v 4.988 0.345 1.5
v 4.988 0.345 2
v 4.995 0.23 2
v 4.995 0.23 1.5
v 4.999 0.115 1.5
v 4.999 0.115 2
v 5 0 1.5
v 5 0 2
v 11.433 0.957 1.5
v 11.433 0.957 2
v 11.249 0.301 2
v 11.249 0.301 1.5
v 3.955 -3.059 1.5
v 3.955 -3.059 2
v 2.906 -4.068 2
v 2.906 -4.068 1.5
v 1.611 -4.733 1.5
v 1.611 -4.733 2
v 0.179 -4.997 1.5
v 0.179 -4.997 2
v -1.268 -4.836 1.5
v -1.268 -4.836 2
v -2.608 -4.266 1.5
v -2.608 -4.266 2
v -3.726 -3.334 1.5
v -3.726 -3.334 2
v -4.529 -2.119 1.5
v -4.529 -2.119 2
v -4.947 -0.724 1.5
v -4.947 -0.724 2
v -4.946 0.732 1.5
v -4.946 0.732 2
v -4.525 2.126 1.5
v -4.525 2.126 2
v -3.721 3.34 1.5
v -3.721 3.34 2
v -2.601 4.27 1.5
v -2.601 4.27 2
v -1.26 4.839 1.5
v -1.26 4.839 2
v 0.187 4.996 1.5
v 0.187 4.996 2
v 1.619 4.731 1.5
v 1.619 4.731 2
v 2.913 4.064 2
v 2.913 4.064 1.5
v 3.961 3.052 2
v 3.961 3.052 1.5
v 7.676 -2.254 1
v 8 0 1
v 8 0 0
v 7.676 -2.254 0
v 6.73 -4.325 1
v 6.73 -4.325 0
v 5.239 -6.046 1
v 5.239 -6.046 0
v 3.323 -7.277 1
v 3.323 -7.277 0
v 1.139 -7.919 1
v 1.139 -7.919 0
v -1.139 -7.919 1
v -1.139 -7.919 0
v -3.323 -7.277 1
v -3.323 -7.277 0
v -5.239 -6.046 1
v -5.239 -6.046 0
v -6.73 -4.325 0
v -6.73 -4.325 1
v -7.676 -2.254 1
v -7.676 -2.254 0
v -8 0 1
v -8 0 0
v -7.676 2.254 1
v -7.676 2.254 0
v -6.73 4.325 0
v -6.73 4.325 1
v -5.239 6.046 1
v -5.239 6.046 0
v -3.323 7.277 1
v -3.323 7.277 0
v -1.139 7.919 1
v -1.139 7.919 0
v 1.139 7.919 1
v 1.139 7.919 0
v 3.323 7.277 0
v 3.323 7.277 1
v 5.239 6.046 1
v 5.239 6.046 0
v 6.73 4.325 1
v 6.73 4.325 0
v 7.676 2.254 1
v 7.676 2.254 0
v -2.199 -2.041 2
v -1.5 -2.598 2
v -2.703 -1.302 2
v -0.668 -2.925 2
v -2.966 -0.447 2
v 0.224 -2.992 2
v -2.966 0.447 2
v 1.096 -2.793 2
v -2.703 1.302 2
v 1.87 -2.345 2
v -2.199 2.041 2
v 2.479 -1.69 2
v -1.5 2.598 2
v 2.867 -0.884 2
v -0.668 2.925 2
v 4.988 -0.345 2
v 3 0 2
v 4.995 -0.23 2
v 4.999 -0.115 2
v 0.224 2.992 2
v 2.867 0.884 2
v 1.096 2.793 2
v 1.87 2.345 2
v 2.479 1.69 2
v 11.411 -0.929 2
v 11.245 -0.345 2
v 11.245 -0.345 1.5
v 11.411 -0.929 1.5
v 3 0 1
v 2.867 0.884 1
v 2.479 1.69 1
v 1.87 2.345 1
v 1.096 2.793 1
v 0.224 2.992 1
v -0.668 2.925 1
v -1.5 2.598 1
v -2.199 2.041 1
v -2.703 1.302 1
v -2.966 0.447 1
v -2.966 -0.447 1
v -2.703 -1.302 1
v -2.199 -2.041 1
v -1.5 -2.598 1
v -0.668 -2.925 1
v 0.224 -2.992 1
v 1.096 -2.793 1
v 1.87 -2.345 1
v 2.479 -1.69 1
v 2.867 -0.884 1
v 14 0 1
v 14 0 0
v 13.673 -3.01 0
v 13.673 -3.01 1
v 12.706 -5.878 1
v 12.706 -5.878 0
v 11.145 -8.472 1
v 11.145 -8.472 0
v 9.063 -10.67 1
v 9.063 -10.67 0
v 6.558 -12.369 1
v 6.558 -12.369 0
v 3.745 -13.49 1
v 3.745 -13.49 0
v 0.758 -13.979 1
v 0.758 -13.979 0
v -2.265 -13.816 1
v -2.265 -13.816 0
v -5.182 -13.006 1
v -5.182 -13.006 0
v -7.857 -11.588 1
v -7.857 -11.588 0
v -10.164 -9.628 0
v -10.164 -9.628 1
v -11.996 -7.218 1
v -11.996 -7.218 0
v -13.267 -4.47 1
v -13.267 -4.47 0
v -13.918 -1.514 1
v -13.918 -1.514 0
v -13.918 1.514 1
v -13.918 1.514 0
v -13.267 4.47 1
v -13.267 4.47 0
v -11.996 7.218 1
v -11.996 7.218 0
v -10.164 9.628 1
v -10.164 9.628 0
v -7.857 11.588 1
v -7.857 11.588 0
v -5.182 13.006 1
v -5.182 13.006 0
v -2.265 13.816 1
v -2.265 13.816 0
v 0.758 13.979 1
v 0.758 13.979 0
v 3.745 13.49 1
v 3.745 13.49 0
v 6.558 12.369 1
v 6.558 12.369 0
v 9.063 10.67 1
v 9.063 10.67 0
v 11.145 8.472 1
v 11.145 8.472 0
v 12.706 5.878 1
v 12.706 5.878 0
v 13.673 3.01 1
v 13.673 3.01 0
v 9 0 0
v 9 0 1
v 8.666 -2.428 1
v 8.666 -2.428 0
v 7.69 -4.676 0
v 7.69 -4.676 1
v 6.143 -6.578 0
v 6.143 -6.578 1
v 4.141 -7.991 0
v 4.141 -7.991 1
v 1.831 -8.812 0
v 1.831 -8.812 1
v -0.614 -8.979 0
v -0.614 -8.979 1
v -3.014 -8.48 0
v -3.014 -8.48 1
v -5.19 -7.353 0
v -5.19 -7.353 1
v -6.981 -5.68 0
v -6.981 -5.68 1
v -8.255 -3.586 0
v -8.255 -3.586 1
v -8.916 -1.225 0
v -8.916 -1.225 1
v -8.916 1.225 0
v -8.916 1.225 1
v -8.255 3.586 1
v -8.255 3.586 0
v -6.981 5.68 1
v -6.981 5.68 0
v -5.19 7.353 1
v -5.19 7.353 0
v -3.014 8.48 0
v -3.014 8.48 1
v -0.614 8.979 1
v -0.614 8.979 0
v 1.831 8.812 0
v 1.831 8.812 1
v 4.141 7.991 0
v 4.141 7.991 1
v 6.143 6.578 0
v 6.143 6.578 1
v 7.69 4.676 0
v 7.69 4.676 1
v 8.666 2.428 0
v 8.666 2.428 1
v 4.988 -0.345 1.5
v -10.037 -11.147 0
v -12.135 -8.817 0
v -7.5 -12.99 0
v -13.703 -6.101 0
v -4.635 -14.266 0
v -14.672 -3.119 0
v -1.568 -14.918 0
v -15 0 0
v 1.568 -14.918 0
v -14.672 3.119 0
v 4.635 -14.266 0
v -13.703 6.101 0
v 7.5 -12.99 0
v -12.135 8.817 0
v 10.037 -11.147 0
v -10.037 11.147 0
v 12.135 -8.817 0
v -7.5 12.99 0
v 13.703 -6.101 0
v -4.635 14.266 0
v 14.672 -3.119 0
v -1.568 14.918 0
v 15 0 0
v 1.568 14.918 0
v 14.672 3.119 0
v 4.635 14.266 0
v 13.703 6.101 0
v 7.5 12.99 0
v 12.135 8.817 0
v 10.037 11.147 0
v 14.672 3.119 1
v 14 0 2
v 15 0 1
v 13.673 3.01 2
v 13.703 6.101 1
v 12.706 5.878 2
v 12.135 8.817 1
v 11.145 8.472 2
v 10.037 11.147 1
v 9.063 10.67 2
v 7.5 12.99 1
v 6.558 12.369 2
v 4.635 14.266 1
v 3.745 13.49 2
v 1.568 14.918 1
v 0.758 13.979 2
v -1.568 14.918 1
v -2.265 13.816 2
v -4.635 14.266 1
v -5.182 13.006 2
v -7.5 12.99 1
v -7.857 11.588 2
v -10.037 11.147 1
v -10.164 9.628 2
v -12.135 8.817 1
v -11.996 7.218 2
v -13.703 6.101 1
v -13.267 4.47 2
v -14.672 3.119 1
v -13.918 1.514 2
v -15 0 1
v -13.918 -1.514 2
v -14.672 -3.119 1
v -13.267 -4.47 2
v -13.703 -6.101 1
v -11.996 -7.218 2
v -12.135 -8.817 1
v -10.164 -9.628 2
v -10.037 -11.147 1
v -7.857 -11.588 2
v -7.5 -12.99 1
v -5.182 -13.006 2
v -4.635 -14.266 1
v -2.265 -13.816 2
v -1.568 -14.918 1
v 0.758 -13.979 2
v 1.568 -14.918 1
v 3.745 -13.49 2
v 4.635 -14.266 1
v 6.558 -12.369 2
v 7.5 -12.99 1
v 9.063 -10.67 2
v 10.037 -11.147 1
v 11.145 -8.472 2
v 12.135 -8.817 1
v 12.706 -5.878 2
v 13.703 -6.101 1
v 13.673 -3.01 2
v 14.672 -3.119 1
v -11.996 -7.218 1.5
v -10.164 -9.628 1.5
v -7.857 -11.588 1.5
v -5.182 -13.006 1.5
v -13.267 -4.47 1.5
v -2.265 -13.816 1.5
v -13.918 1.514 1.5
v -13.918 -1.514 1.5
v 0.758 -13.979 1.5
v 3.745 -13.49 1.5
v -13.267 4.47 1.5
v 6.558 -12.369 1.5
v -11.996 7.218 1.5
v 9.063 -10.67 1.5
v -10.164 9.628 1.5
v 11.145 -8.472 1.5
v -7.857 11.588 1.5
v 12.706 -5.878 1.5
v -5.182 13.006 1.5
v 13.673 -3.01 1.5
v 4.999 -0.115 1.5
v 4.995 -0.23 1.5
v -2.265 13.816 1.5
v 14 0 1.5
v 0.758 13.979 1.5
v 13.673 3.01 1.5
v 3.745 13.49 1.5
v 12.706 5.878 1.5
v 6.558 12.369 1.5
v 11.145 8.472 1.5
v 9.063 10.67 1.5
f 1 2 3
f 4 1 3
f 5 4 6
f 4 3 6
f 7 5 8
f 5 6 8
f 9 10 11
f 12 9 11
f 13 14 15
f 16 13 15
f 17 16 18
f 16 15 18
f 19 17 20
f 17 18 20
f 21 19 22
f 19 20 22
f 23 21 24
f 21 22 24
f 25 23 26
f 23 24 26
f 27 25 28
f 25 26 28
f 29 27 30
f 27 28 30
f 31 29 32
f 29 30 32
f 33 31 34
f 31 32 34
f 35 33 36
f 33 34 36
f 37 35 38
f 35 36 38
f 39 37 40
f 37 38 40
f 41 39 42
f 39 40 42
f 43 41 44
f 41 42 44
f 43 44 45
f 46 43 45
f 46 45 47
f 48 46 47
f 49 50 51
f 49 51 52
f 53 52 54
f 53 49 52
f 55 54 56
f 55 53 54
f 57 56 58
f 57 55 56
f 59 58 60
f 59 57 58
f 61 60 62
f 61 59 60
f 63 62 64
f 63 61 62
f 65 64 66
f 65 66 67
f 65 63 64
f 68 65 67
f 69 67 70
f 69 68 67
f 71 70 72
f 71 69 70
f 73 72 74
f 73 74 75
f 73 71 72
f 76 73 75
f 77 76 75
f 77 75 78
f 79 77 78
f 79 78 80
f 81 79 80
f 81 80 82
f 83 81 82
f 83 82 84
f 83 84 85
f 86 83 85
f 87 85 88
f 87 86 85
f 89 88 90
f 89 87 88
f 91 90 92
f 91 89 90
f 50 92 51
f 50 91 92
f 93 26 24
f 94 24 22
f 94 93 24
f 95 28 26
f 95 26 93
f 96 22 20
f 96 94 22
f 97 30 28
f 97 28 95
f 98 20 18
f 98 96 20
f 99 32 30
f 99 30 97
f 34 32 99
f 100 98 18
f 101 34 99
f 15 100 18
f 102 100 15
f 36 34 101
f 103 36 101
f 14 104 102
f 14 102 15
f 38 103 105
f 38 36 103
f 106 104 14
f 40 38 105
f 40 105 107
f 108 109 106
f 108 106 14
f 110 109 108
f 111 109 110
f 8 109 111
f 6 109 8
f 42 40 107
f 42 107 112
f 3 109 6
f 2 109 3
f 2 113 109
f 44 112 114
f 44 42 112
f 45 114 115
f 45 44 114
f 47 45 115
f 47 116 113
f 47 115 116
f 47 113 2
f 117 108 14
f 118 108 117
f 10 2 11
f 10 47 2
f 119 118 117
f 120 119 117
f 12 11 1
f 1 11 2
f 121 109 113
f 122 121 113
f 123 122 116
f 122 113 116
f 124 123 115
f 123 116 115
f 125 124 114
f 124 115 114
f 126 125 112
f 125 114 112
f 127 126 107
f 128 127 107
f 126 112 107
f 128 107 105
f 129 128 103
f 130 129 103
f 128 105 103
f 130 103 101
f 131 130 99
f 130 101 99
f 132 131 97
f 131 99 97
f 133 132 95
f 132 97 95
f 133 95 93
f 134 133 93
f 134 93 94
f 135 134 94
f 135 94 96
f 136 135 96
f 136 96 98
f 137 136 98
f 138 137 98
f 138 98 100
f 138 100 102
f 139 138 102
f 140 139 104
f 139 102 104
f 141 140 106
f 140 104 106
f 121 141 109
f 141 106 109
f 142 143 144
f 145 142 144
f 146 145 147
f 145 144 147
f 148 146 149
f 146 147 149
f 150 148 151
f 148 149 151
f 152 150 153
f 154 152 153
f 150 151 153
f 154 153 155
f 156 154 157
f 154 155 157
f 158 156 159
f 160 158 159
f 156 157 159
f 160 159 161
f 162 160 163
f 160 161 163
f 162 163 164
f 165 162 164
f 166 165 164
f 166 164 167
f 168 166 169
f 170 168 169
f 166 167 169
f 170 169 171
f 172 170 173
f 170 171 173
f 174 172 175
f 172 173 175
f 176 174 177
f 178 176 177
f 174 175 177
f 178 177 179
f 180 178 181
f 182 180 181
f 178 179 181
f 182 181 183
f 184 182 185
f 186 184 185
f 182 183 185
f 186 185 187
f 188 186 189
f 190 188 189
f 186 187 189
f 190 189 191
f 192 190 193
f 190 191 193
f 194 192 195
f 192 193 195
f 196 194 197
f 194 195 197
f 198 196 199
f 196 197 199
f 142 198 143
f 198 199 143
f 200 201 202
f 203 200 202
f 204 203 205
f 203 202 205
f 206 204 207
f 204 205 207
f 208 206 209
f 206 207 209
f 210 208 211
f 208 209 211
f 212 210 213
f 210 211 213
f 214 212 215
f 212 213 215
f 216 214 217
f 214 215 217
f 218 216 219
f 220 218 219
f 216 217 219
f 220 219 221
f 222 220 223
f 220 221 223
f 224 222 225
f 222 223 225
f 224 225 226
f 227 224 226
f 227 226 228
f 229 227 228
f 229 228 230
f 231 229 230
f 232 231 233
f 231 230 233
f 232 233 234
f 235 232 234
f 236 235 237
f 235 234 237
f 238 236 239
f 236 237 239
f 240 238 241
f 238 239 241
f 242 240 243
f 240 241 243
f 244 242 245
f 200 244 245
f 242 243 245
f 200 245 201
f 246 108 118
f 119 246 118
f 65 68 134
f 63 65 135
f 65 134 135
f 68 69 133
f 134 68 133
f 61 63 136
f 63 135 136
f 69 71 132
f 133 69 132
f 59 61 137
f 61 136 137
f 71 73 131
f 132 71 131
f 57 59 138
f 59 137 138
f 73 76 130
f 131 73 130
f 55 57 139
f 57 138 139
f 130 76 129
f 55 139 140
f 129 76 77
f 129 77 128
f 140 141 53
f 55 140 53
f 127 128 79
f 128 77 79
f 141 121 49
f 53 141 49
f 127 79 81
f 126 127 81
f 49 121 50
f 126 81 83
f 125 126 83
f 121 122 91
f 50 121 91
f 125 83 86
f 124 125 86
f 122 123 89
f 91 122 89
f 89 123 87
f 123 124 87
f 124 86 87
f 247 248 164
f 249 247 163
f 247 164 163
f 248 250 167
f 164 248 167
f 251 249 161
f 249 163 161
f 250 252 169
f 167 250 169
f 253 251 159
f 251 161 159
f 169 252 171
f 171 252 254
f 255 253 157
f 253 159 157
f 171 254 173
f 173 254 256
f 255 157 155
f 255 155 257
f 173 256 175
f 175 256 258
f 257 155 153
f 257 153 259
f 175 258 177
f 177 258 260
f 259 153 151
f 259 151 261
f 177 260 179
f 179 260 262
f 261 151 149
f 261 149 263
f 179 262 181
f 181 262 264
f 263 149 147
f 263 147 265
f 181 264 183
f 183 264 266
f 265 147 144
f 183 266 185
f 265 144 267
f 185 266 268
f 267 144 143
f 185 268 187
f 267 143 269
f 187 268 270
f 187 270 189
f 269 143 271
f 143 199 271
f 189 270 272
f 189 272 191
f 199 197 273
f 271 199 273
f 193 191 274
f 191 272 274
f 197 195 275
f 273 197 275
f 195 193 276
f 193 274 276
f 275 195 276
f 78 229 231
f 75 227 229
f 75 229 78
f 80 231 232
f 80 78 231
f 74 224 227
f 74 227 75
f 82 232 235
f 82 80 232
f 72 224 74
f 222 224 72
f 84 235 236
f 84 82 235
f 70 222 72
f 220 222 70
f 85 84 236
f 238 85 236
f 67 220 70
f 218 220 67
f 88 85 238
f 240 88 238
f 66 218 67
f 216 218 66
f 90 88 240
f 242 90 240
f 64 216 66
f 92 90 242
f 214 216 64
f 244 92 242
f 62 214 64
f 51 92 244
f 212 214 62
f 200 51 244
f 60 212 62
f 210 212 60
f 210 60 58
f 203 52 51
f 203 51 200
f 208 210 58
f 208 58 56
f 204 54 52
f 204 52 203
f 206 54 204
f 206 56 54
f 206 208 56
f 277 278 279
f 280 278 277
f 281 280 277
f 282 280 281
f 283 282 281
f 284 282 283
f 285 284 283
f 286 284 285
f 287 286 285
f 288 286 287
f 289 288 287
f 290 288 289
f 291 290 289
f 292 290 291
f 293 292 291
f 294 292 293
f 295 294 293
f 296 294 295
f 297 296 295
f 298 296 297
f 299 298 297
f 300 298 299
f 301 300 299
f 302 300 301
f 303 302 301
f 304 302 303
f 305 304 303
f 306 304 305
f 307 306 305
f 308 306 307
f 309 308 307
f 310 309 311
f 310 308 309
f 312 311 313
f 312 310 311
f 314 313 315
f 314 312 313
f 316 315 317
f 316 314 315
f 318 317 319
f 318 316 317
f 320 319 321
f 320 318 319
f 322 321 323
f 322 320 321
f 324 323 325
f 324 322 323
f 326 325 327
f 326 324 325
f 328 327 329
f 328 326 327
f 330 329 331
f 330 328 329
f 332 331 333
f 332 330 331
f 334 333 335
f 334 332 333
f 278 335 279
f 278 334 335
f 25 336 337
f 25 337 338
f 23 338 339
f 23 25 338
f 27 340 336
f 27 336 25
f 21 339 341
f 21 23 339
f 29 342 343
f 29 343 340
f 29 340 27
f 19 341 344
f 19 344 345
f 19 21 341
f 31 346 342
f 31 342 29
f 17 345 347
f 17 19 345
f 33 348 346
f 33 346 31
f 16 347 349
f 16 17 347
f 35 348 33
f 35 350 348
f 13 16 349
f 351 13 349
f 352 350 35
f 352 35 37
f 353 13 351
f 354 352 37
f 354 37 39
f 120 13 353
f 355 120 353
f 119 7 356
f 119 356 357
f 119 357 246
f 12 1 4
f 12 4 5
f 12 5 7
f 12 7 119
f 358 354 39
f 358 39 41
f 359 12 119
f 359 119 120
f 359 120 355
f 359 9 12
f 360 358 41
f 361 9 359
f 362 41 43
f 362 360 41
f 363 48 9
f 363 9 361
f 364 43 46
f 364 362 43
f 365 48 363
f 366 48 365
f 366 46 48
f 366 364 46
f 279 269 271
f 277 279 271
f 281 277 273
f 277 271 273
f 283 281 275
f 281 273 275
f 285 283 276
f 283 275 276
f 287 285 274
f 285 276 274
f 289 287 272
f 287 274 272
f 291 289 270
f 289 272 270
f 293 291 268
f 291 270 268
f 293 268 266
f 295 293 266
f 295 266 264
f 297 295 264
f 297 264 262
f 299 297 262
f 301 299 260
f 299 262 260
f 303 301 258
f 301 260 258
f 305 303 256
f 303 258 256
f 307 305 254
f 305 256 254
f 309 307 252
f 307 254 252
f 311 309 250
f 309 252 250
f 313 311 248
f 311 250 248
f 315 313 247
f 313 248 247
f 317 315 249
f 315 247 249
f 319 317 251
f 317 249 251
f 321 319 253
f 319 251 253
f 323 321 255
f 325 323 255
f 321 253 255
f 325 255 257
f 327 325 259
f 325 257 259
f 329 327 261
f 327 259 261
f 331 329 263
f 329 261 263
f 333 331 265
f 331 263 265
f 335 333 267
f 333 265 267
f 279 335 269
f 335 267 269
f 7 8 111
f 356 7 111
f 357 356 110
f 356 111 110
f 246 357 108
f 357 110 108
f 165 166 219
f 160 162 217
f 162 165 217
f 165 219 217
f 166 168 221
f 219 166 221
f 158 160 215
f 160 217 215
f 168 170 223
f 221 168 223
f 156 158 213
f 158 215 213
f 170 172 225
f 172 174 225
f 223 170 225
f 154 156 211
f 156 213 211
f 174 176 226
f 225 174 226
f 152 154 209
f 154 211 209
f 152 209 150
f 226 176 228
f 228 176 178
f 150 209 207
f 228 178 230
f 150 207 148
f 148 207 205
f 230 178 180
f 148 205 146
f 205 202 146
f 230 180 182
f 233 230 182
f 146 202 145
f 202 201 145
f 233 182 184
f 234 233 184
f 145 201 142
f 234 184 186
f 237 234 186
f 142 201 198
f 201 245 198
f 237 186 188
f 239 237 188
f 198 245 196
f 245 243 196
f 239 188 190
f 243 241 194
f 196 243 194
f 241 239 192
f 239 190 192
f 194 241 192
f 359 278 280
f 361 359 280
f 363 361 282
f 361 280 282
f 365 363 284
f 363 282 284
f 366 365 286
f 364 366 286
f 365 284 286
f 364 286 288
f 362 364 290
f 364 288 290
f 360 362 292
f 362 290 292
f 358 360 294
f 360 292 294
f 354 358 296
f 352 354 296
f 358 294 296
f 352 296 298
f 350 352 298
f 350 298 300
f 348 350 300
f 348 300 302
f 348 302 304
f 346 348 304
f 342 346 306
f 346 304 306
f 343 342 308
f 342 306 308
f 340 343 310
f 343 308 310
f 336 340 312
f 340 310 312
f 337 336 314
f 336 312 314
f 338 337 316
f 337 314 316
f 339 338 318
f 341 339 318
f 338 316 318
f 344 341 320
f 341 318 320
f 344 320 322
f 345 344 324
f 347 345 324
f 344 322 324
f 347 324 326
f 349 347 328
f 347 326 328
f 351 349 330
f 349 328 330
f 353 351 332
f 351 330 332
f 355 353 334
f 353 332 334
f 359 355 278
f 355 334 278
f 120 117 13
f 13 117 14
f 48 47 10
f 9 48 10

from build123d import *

# Parameters (mm, degrees)
F0_R      = 15
F1_DEPTH  = 2
F2_R      = 14
F3_DEPTH  = 1
F4_SIZE   = 1
F5_R      = 4
F6_DEPTH  = 25
F8_R      = 14
F9_DEPTH  = 0.5
F10_R     = 4
F10_R_2   = 3
F11_DEPTH = 1
F12_R     = 9
F12_R_2   = 8
F13_DEPTH = 1


with BuildPart() as f1:
    # F0 (on Top) → F1 (new body)
    with BuildSketch(Plane.XY):
        Circle(F0_R)
    extrude(amount=F1_DEPTH)

    # F2 (on face) → F3 (cut)
    with BuildSketch(Plane(origin=(0, 0, 0), x_dir=(1, 0, 0), z_dir=(0, 0, -1))):
        Circle(F2_R)
    extrude(amount=-F3_DEPTH, mode=Mode.SUBTRACT)

    # F4
    f4_edges = [f1.edges().sort_by_distance(p)[0] for p in [
        (-15, 0, 2),
    ]]
    chamfer(f4_edges, length=F4_SIZE)

    # F5 (on face) → F6 (cut)
    with BuildSketch(Plane.XY.offset(2)):
        Circle(F5_R)
    extrude(amount=-F6_DEPTH, mode=Mode.SUBTRACT)

    # F8 (on face) → F9 (cut)
    with BuildSketch(Plane.XY.offset(2)):
        Circle(F8_R)
        with BuildLine():
            ThreePointArc((4.9880774736, 0.3450842174), (4.9970184795, 0.1726450576), (5, 0))
            ThreePointArc((5, 0), (4.9970184795, -0.1726450576), (4.9880774736, -0.3450842174))
            Line((4.9880774736, -0.3450842174), (11.2447906452, -0.3450842174))
            Line((11.2447906452, -0.3450842174), (11.4114703611, -0.9285551496))
            Line((11.4114703611, -0.9285551496), (3.955437905, -3.0585145054))
            ThreePointArc((3.955437905, -3.0585145054), (-4.9999982746, 0.00415382), (3.9605142509, 3.0519382151))
            Line((3.9605142509, 3.0519382151), (11.4327203482, 0.956684351))
            Line((11.4327203482, 0.956684351), (11.2488549203, 0.3009736538))
            Line((11.2488549203, 0.3009736538), (4.9880774736, 0.3450842174))
        make_face(mode=Mode.SUBTRACT)
    extrude(amount=-F9_DEPTH, mode=Mode.SUBTRACT)

    # F10 (on face) → F11 (join)
    with BuildSketch(Plane.XY.offset(2)):
        Circle(F10_R)
        Circle(F10_R_2, mode=Mode.SUBTRACT)
    extrude(amount=-F11_DEPTH)

    # F12 (on face) → F13 (join)
    with BuildSketch(Plane(origin=(0, 0, 1), x_dir=(1, 0, 0), z_dir=(0, 0, -1))):
        Circle(F12_R)
        Circle(F12_R_2, mode=Mode.SUBTRACT)
    extrude(amount=F13_DEPTH)


solid = f1.part
